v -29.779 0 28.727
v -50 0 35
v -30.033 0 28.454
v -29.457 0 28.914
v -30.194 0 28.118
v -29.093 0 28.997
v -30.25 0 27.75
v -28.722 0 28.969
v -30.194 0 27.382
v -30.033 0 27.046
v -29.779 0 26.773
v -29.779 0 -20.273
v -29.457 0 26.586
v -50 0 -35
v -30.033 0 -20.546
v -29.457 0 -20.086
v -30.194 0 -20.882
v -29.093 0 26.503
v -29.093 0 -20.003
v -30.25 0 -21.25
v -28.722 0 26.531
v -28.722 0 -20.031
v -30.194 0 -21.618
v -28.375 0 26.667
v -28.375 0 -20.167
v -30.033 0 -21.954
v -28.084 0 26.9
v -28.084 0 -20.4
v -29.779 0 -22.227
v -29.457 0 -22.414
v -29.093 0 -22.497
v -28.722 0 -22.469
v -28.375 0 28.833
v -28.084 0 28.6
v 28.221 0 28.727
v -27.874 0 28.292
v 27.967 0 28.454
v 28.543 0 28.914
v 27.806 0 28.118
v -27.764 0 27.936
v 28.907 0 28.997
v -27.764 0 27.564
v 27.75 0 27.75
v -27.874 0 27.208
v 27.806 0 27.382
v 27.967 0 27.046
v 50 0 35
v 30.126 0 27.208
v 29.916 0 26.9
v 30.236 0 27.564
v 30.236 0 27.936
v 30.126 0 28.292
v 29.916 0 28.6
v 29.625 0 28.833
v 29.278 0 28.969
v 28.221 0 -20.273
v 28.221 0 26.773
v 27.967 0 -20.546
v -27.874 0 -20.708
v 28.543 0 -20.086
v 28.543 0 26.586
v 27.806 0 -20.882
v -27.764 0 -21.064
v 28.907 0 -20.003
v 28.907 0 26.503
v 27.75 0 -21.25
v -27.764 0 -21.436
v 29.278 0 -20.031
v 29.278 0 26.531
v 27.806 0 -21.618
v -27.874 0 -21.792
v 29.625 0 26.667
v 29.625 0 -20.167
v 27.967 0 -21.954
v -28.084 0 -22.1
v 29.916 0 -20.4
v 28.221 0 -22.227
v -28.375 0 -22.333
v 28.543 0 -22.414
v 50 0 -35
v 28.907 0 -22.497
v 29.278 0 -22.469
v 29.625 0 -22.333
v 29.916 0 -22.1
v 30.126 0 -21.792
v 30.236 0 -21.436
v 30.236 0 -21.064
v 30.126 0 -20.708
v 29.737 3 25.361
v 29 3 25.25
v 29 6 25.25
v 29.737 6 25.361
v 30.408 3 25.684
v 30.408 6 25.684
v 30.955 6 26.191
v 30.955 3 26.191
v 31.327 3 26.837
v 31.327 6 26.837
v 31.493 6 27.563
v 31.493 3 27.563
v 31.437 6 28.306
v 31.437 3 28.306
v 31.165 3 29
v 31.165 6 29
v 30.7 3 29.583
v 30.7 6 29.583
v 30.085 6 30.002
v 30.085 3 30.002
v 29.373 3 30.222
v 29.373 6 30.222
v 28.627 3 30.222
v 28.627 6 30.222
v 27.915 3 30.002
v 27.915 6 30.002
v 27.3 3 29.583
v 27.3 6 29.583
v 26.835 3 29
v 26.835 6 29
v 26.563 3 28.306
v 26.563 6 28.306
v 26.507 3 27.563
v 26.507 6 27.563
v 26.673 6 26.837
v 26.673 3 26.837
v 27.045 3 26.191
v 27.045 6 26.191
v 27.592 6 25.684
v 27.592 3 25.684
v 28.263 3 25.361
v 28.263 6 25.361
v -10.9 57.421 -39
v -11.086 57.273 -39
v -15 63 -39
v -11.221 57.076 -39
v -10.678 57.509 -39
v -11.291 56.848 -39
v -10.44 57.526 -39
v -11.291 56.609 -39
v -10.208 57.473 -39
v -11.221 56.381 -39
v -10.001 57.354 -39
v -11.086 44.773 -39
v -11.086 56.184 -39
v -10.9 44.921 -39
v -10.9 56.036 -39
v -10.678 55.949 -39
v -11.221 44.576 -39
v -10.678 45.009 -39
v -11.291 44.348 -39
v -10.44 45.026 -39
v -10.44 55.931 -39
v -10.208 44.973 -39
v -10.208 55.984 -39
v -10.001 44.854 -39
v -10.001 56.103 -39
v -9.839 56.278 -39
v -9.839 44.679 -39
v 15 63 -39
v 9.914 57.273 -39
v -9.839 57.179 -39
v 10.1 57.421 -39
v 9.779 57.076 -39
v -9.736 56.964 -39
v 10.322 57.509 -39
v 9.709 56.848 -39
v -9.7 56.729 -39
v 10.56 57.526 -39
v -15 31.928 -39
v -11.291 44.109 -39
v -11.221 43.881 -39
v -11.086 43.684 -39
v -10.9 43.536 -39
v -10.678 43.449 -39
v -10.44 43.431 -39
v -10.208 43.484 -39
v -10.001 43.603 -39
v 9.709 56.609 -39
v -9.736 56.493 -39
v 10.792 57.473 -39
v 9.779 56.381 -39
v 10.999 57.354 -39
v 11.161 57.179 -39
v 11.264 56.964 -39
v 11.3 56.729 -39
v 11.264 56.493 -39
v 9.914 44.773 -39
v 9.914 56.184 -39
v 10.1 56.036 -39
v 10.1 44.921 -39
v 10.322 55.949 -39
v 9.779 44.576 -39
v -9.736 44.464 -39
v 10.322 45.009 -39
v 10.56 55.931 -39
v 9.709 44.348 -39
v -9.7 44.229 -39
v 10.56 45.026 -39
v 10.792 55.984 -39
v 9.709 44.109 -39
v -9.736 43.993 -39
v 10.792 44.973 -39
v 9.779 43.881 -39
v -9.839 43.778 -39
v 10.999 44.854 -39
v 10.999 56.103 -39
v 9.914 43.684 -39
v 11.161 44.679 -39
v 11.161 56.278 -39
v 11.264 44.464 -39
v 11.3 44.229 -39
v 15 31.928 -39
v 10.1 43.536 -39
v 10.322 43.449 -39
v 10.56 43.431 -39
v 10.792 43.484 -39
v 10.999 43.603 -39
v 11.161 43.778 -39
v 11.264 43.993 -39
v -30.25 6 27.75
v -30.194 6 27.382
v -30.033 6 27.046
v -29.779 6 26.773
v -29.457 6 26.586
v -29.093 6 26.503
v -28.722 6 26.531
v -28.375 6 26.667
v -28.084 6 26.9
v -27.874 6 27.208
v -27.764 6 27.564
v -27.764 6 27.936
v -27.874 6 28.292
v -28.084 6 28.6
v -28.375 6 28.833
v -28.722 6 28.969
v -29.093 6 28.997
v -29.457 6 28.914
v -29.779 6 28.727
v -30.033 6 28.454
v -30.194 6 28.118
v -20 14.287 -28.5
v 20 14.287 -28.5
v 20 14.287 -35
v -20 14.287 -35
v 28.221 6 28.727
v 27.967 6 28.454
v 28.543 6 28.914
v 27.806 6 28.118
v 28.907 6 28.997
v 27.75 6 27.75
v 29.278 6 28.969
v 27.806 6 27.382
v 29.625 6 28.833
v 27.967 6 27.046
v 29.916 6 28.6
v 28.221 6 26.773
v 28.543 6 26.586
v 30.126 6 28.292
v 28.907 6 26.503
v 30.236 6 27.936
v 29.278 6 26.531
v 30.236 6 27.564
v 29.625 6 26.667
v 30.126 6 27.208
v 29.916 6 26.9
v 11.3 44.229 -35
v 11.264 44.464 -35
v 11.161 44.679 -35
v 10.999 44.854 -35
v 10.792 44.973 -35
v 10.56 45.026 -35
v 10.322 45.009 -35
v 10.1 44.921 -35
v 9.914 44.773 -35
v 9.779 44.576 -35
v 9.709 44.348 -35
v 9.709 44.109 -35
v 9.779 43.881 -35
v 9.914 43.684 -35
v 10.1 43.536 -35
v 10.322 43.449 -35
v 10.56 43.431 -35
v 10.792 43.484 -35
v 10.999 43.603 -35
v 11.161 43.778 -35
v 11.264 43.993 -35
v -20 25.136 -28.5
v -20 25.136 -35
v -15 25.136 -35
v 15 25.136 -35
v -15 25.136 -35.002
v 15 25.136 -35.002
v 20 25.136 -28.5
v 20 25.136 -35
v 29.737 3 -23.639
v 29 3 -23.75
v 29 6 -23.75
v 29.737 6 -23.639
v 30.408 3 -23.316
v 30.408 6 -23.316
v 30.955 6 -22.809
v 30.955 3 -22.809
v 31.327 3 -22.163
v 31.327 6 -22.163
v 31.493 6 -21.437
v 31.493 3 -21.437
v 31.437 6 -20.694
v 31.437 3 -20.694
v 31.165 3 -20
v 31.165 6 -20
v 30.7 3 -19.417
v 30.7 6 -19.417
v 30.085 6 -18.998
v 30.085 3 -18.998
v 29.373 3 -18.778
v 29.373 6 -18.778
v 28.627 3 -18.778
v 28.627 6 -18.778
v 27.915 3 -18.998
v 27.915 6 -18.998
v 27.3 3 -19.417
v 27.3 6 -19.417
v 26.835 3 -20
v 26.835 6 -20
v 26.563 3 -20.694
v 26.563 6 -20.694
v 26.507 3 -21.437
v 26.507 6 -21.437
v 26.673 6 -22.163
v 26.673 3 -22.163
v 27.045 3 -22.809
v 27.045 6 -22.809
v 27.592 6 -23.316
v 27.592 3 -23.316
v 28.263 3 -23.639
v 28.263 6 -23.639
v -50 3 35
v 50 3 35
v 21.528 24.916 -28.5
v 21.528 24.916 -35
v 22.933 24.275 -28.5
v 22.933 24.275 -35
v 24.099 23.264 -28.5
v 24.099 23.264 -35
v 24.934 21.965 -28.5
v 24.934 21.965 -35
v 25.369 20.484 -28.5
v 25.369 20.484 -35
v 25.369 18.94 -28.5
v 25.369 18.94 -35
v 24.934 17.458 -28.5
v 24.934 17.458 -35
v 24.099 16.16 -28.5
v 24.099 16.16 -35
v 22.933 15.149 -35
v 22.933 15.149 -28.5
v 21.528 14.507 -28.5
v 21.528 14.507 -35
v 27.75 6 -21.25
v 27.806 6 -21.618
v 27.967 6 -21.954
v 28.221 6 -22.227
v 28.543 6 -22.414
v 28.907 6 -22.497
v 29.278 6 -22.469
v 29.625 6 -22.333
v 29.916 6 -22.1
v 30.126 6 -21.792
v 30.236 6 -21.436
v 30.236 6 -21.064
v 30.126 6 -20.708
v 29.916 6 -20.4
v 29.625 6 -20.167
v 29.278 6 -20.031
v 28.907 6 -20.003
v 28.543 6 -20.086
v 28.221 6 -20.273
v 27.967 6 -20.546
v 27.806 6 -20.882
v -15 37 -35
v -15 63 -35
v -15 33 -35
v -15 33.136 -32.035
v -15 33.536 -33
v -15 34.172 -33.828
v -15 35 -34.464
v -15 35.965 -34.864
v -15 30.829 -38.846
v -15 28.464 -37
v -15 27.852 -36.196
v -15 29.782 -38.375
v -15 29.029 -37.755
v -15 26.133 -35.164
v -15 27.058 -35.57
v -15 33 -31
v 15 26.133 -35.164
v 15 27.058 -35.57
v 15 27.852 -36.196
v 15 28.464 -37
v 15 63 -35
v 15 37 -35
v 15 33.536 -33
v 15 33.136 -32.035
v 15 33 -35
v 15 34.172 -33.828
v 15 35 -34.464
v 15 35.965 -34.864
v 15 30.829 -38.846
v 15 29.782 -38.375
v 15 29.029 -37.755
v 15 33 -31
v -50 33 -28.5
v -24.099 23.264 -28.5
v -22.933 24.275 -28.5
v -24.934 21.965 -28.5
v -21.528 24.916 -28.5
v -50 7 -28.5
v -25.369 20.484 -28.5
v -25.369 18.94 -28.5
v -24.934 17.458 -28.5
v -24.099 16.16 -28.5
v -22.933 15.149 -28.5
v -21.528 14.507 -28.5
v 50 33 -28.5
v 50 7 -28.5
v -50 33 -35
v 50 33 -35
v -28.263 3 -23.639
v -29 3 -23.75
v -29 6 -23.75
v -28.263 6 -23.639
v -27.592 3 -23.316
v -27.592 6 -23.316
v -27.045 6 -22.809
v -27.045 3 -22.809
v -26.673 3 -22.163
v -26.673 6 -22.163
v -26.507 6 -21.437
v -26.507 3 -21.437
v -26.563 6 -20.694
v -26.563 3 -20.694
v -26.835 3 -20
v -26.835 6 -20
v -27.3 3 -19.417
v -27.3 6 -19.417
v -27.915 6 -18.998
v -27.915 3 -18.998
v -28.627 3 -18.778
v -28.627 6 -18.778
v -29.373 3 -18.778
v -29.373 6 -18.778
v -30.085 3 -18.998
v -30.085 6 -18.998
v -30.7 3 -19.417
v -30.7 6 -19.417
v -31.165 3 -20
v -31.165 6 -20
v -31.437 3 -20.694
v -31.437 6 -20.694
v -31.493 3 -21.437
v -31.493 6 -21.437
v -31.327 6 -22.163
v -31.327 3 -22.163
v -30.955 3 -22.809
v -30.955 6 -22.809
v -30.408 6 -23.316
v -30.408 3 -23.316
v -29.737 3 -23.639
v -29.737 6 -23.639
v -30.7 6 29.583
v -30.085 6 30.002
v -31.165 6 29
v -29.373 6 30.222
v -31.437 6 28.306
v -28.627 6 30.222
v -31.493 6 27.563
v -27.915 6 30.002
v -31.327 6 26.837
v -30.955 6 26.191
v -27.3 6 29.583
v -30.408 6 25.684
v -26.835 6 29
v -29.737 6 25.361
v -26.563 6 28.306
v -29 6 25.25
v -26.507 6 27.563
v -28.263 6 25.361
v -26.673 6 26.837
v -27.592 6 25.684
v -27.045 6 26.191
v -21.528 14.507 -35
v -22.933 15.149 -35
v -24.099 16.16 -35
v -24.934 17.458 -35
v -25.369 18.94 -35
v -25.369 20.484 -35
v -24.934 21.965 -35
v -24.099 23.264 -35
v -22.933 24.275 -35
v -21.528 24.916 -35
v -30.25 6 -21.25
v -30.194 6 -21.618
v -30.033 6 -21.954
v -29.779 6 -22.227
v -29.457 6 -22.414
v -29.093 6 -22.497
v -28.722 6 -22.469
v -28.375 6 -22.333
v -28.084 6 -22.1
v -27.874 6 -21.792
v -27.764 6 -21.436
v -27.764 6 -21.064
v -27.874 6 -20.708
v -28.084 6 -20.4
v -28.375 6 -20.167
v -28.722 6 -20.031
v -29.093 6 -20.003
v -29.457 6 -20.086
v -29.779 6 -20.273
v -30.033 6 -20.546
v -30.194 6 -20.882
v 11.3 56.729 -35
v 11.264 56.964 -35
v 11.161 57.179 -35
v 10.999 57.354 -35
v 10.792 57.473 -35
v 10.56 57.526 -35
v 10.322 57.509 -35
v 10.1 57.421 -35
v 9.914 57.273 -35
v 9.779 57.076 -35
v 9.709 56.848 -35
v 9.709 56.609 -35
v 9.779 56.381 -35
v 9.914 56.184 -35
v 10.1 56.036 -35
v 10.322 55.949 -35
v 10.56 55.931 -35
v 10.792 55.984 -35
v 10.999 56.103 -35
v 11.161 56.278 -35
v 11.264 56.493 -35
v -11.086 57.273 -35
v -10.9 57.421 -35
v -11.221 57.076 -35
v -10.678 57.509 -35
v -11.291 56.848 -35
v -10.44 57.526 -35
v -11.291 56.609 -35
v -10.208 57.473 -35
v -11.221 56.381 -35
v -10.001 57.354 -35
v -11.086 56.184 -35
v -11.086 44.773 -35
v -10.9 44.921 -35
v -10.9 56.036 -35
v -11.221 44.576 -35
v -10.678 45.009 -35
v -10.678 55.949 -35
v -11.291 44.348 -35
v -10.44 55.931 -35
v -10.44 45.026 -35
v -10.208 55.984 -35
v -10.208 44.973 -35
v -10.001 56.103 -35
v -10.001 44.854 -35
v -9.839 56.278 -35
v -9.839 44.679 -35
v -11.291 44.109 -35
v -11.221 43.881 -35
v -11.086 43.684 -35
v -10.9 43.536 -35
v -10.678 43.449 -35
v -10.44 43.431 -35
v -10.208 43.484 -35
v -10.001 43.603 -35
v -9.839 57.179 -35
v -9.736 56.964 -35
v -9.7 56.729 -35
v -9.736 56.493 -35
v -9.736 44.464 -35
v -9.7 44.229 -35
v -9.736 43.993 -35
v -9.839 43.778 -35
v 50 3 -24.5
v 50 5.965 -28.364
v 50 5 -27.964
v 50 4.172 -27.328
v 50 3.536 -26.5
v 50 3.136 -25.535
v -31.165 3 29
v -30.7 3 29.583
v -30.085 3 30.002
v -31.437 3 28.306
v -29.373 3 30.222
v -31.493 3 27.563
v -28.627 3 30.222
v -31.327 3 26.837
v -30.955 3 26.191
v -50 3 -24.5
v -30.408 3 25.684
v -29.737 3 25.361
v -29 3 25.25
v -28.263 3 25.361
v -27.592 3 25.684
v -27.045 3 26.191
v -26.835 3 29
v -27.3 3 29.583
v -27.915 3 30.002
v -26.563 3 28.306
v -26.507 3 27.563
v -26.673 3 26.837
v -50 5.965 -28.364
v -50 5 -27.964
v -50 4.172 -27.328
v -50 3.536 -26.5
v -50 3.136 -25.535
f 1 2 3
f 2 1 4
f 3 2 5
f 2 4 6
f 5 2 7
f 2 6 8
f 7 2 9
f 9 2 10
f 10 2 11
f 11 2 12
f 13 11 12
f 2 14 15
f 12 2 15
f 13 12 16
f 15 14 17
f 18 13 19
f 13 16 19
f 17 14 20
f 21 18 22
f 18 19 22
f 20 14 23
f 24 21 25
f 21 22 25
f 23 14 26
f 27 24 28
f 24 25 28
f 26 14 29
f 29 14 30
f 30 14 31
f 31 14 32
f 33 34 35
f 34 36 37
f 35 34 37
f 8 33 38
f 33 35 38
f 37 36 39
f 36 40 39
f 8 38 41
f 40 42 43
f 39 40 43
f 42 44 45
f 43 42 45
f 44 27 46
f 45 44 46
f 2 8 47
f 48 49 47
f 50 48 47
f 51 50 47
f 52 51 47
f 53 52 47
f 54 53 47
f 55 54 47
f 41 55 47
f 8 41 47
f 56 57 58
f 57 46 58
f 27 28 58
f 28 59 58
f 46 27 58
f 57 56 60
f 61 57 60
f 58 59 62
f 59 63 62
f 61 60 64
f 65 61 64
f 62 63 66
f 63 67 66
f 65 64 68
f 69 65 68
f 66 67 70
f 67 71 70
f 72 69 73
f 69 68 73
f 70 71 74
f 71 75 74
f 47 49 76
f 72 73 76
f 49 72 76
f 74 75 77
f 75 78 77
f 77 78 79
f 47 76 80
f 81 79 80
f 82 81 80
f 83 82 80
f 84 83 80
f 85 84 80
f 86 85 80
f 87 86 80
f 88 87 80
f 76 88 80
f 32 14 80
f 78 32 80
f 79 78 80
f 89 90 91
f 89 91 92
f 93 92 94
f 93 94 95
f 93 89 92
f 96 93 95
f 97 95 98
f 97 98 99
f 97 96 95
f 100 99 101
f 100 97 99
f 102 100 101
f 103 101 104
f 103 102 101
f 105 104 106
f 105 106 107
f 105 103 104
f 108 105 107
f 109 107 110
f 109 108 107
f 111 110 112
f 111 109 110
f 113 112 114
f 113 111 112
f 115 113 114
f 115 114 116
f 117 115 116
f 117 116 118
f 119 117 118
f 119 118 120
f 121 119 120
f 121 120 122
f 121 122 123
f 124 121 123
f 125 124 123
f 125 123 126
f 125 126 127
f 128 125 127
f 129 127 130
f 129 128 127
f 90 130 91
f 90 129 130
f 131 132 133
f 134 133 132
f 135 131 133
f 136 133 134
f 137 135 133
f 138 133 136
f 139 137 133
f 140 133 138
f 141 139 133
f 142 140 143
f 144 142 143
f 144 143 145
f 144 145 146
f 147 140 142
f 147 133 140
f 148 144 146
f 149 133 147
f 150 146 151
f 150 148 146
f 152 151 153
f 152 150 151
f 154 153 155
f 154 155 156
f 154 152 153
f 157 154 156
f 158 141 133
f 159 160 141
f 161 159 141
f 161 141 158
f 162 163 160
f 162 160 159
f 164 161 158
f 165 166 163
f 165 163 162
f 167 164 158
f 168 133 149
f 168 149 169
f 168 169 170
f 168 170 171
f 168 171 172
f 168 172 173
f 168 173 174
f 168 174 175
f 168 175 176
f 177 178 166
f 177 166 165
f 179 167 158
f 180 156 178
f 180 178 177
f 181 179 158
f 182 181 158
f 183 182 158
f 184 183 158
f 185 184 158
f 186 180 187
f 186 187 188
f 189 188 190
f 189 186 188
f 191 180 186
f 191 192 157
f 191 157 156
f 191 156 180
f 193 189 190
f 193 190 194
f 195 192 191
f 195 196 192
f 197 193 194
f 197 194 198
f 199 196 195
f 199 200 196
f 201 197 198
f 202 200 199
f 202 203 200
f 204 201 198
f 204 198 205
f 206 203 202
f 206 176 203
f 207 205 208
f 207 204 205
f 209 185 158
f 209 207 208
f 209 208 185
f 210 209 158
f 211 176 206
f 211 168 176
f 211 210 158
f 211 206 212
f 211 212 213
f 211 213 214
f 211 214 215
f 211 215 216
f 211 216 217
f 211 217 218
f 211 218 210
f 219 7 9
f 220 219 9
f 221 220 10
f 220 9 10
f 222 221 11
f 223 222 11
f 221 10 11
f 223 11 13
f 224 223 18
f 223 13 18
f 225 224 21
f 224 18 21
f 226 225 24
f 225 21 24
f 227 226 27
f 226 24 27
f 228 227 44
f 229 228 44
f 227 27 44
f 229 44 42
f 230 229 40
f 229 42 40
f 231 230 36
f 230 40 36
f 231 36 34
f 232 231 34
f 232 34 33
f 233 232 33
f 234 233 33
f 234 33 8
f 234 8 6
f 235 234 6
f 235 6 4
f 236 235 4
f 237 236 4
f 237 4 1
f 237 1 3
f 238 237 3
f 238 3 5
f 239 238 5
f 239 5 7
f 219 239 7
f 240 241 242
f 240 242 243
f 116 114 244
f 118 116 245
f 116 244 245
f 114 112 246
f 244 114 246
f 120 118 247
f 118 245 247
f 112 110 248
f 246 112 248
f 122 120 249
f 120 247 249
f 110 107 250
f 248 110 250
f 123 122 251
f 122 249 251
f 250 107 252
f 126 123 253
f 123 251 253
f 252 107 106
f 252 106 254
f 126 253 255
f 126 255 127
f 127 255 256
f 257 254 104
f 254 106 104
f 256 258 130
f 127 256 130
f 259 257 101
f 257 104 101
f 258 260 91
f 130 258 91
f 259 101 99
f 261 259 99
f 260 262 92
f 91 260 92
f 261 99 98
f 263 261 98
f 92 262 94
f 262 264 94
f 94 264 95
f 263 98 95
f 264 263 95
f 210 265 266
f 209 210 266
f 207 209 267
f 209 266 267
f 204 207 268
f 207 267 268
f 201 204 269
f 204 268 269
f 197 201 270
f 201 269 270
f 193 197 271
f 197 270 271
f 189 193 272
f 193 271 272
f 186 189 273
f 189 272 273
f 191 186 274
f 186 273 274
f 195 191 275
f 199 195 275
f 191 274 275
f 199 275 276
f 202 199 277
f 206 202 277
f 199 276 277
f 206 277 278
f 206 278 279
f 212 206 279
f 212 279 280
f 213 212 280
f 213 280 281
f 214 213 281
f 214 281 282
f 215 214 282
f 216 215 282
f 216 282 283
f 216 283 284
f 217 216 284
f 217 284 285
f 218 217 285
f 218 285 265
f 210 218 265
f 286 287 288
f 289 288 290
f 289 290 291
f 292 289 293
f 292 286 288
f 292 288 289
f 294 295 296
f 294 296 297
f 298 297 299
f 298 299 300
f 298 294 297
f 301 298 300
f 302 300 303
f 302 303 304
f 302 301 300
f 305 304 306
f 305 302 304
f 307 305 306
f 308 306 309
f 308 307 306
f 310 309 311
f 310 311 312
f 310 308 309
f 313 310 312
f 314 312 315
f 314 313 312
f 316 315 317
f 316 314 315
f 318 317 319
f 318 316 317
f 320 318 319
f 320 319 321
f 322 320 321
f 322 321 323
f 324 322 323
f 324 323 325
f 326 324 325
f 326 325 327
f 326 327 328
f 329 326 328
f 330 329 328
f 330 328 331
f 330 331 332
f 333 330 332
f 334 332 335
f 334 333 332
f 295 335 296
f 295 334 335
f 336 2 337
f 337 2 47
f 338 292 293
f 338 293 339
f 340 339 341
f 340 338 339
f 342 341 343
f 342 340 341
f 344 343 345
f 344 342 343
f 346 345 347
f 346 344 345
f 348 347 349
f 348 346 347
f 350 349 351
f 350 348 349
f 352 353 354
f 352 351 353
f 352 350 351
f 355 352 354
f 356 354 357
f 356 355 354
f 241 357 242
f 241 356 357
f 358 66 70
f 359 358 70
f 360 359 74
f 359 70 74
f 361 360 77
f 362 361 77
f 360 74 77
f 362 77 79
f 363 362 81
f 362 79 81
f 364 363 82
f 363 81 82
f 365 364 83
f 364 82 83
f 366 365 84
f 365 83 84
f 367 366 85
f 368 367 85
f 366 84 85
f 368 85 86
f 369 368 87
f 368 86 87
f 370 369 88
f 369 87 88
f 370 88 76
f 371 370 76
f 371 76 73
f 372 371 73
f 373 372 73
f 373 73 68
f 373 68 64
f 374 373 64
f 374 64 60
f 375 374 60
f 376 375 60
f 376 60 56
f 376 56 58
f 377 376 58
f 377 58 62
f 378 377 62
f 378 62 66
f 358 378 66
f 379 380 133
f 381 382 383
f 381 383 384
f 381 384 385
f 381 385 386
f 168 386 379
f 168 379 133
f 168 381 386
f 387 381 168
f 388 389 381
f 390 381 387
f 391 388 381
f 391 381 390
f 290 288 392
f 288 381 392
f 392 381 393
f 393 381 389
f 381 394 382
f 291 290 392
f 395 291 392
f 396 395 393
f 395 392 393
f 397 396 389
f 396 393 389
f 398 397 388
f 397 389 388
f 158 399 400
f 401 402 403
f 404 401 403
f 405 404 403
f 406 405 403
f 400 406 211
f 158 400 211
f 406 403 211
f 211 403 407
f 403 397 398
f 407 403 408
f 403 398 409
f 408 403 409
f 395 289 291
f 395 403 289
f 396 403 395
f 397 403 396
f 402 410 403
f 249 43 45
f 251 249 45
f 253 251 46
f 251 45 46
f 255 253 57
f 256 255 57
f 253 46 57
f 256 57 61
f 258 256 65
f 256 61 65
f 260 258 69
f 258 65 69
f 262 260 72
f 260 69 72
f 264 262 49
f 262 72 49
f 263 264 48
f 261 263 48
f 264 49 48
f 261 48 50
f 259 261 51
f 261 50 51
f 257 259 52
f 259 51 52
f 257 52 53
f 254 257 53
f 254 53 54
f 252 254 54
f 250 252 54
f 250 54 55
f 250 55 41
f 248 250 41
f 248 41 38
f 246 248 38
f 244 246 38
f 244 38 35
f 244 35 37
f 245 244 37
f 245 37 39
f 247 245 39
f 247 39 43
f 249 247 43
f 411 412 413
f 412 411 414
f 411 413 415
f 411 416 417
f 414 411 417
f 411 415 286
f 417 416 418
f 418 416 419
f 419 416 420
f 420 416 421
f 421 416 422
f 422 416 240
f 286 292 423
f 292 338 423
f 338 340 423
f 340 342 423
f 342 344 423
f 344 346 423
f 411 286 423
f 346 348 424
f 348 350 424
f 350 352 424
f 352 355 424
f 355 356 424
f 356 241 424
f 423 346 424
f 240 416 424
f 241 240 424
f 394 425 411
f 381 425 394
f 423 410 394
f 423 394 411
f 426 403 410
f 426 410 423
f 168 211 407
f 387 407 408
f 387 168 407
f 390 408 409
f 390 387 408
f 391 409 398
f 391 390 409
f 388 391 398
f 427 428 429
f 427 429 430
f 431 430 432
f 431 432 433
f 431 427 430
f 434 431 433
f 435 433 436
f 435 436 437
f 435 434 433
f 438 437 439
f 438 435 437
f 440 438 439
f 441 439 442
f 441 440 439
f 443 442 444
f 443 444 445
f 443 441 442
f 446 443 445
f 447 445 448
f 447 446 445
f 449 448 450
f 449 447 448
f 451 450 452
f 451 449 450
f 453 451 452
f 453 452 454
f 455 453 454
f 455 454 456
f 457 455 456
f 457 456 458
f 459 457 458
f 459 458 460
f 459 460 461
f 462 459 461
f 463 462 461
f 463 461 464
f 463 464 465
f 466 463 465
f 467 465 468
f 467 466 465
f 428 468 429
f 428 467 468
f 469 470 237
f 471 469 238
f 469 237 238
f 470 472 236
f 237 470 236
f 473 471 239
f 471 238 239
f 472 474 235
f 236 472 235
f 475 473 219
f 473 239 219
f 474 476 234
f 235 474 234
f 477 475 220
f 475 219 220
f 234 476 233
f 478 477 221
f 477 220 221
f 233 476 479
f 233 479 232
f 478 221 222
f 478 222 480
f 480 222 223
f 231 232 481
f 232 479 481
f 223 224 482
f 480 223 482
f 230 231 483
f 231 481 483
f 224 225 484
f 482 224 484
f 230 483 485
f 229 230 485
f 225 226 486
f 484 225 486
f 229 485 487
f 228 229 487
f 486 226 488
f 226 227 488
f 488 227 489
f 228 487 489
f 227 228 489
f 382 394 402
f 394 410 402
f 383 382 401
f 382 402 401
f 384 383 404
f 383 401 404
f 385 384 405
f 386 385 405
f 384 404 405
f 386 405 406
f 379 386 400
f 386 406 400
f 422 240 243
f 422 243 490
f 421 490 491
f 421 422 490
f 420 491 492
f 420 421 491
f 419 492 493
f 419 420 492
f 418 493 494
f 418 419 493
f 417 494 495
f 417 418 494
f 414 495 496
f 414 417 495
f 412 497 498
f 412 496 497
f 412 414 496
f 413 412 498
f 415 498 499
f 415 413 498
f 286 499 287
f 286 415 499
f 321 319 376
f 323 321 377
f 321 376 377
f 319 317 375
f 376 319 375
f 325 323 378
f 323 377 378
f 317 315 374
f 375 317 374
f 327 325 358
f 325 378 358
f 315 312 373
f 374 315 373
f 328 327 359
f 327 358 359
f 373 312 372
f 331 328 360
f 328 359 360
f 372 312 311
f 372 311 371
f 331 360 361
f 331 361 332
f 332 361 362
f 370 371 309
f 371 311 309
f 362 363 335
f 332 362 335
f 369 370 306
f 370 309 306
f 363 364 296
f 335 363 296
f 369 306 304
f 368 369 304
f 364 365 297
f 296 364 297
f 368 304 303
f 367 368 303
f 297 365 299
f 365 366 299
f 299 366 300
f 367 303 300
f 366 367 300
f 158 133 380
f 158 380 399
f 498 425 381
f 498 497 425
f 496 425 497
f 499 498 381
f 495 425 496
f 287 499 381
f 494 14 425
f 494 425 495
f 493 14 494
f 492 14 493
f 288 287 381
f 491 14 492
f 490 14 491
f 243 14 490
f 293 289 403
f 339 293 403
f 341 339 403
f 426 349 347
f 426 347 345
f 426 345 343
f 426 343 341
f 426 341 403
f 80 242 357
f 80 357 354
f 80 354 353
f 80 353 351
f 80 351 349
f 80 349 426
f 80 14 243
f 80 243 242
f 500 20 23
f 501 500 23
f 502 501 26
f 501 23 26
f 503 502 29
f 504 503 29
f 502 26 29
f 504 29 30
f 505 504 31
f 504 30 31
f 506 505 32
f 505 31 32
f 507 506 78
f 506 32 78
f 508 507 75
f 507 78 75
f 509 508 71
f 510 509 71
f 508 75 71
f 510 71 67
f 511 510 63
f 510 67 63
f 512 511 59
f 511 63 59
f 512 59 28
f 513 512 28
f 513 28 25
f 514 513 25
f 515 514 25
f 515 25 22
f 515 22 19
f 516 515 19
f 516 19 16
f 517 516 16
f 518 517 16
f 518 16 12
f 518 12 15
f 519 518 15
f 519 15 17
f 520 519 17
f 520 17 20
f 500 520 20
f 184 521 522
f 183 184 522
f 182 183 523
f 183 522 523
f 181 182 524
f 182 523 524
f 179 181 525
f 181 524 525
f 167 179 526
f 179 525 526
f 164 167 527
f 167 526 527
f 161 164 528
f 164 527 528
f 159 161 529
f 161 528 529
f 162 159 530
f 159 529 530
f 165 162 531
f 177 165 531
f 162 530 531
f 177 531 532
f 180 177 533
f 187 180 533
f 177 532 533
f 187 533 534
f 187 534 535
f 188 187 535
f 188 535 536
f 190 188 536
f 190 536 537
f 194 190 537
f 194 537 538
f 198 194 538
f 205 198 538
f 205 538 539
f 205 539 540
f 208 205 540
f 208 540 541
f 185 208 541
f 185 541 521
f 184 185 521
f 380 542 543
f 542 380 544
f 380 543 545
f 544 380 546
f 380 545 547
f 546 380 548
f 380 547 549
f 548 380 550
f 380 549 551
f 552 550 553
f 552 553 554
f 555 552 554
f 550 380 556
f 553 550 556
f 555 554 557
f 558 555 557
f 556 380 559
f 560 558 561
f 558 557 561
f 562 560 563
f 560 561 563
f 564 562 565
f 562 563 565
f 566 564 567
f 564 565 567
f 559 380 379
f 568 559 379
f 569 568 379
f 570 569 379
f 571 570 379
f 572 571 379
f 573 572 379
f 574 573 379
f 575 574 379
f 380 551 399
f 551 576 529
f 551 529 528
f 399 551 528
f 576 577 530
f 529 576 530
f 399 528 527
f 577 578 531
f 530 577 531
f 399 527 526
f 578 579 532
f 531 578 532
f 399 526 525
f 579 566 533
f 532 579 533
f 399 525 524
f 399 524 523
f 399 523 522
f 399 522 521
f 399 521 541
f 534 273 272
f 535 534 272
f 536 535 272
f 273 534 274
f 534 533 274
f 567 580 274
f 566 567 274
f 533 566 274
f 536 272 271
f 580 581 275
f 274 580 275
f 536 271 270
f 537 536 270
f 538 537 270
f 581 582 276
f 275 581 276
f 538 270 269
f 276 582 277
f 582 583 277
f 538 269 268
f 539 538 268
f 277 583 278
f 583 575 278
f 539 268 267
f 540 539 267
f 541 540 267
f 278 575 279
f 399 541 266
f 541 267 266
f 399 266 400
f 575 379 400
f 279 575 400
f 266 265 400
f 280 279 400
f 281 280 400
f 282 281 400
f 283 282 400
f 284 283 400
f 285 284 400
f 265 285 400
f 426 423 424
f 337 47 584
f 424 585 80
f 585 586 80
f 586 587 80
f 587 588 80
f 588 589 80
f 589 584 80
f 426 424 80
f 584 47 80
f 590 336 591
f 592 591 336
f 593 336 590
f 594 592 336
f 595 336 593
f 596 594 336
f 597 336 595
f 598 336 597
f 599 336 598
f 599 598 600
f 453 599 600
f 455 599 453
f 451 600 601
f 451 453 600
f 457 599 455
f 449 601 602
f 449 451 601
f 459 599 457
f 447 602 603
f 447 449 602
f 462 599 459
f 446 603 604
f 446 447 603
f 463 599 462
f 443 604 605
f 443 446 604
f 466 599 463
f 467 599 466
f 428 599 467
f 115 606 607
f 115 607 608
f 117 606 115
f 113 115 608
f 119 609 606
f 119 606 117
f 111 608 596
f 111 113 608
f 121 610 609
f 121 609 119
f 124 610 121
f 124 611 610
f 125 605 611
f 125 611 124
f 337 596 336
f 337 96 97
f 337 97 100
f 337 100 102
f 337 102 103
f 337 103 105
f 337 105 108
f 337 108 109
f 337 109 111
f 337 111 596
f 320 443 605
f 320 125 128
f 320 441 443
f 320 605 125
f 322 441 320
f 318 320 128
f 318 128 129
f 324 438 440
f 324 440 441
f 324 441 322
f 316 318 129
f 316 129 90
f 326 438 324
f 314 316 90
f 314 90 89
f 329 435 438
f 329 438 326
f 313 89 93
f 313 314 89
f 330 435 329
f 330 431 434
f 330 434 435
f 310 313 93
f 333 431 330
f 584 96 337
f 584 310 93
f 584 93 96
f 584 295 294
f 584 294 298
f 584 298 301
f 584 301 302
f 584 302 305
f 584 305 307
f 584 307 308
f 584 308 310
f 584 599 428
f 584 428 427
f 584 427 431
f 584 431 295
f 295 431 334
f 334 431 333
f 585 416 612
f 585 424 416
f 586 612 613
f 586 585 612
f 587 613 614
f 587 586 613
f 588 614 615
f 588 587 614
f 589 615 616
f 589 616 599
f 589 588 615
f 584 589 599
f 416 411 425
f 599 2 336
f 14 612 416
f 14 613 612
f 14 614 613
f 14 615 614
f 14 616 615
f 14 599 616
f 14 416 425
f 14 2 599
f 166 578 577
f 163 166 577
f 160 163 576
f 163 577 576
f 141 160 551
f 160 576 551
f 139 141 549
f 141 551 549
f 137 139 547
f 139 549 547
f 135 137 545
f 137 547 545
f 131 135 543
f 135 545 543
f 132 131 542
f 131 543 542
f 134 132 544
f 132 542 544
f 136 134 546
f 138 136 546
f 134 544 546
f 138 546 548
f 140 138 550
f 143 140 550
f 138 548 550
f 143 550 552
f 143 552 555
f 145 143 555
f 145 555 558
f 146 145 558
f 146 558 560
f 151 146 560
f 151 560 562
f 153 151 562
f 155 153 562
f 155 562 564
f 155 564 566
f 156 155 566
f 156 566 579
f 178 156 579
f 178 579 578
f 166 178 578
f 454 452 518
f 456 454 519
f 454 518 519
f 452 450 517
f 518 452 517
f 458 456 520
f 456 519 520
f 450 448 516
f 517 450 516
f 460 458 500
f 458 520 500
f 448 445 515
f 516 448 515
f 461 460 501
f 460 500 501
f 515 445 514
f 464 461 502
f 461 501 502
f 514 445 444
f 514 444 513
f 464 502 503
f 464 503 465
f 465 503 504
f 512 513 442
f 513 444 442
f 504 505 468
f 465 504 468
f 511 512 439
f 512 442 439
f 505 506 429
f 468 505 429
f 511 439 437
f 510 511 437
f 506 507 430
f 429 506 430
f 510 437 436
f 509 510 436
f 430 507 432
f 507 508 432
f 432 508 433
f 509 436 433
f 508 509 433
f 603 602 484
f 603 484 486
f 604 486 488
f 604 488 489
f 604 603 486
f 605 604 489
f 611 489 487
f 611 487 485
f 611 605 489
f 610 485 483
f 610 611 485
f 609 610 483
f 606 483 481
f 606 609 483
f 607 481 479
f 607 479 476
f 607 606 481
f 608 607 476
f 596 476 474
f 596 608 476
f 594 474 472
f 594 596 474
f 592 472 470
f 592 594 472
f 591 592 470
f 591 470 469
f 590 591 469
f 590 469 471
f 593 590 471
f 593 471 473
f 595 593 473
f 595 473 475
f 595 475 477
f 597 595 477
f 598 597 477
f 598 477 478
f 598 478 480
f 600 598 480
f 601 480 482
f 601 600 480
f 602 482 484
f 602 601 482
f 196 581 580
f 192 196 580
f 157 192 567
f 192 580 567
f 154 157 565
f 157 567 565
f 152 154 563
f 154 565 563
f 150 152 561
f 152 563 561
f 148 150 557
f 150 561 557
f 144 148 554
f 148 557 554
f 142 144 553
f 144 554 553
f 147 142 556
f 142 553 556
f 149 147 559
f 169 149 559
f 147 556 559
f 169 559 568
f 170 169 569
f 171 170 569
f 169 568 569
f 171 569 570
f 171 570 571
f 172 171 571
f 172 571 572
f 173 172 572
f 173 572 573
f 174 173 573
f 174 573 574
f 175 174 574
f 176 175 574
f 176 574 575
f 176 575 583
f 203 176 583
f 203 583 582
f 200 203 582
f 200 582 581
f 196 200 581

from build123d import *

# Parameters (mm, degrees)
SKETCH1_W                 = 100
SKETCH1_H                 = 70
BOSS_EXTRUDE1_DEPTH       = 3
SKETCH2_W                 = 100
SKETCH2_H                 = 6.5
BOSS_EXTRUDE2_DEPTH       = 30
SKETCH14_R                = 2.5
BOSS_EXTRUDE5_DEPTH       = 3
F_2_5MM_DOWEL_HOLE4_D     = 2.5
SKETCH21_W                = 30
SKETCH21_H                = 4
BOSS_EXTRUDE6_DEPTH       = 4
SKETCH22_W                = 30
SKETCH22_H                = 4
BOSS_EXTRUDE7_DEPTH       = 30
FILLET6_R                 = 4
FILLET7_R                 = 4
FILLET8_R                 = 4
M2X0_4_TAPPED_HOLE1_D     = 1.6
M2X0_4_TAPPED_HOLE1_DEPTH = 13
M2X0_4_TAPPED_HOLE1_TIP   = 0.480688495
FILLET9_R                 = 4
CUT_EXTRUDE10_DEPTH       = 14


with BuildPart() as part:
    # Sketch1 → Boss-Extrude1 (new body)
    with BuildSketch(Plane(origin=(0, 0, 0), x_dir=(1, 0, 0), z_dir=(0, 1, 0))):
        Rectangle(SKETCH1_W, SKETCH1_H)
    extrude(amount=BOSS_EXTRUDE1_DEPTH)

    # Sketch2 → Boss-Extrude2 (add)
    with BuildSketch(Plane(origin=(0, 3, 0), x_dir=(1, 0, 0), z_dir=(0, 1, 0))):
        with Locations((0, 31.75)):
            Rectangle(SKETCH2_W, SKETCH2_H)
    extrude(amount=BOSS_EXTRUDE2_DEPTH)

    # Sketch14 → Boss-Extrude5 (add)
    with BuildSketch(Plane(origin=(0, 3, -3), x_dir=(1, 0, 0), z_dir=(0, -1, 0))):
        with Locations(Location((-29, -18.25, 0), (0, 0, 270))):
            Circle(SKETCH14_R)
        with Locations(Location((-29, 30.75, 0), (0, 0, 270))):
            Circle(SKETCH14_R)
        with Locations(Location((29, -18.25, 0), (0, 0, 270))):
            Circle(SKETCH14_R)
        with Locations(Location((29, 30.75, 0), (0, 0, 270))):
            Circle(SKETCH14_R)
    extrude(amount=-BOSS_EXTRUDE5_DEPTH)

    # Ø2.5mm Dowel Hole4 (through all)
    with Locations(Plane(origin=(0, 6, 0), x_dir=(1, 0, 0), z_dir=(0, 1, 0))):
        with Locations((-29, 21.25), (29, 21.25), (29, -27.75), (-29, -27.75)):
            Hole(F_2_5MM_DOWEL_HOLE4_D / 2)

    # Sketch21 → Boss-Extrude6 (add)
    with BuildSketch(Plane(origin=(0, 0, -35), x_dir=(-1, 0, 0), z_dir=(0, 0, -1))):
        with Locations((0, 31)):
            Rectangle(SKETCH21_W, SKETCH21_H)
    extrude(amount=BOSS_EXTRUDE6_DEPTH)

    # Sketch22 → Boss-Extrude7 (add)
    with BuildSketch(Plane(origin=(0, 33, 0), x_dir=(1, 0, 0), z_dir=(0, 1, 0))):
        with Locations((0, 37)):
            Rectangle(SKETCH22_W, SKETCH22_H)
    extrude(amount=BOSS_EXTRUDE7_DEPTH)

    # Fillet6
    fillet6_edges = [part.edges().sort_by_distance(p)[0] for p in [
        (0, 33, -35),
    ]]
    fillet(fillet6_edges, radius=FILLET6_R)

    # Fillet7
    fillet7_edges = [part.edges().sort_by_distance(p)[0] for p in [
        (0, 29, -35),
    ]]
    fillet(fillet7_edges, radius=FILLET7_R - 0.0001)  # a hair under: the kernel refuses the full size

    # Fillet8
    fillet8_edges = [part.edges().sort_by_distance(p)[0] for p in [
        (0, 29, -39),
    ]]
    fillet(fillet8_edges, radius=FILLET8_R)

    # M2x0.4 Tapped Hole1
    with Locations(Plane(origin=(0, 0, -39), x_dir=(-1, 0, 0), z_dir=(0, 0, -1))):
        with Locations((-10.5, 56.728604695), (10.5, 56.728604695), (10.5, 44.228604695), (-10.5, 44.228604695)):
            Hole(M2X0_4_TAPPED_HOLE1_D / 2, depth=M2X0_4_TAPPED_HOLE1_DEPTH)
            with Locations((0, 0, -(M2X0_4_TAPPED_HOLE1_DEPTH + M2X0_4_TAPPED_HOLE1_TIP / 2))):  # 118° drill point
                Cone(0, M2X0_4_TAPPED_HOLE1_D / 2, M2X0_4_TAPPED_HOLE1_TIP, mode=Mode.SUBTRACT)

    # Fillet9
    fillet9_edges = [part.edges().sort_by_distance(p)[0] for p in [
        (0, 3, -28.5),
    ]]
    fillet(fillet9_edges, radius=FILLET9_R)

    # Sketch28 → Cut-Extrude10 (cut)
    with BuildSketch(Plane.XY.offset(-28.5)):
        with BuildLine():
            Line((-20, 25.135697653), (20, 25.135697653))
            ThreePointArc((20, 25.135697653), (25.424121319, 19.711576334), (20, 14.287455015))
            Line((20, 14.287455015), (-20, 14.287455015))
            ThreePointArc((-20, 14.287455015), (-25.424121319, 19.711576334), (-20, 25.135697653))
        make_face()
    extrude(amount=-CUT_EXTRUDE10_DEPTH, mode=Mode.SUBTRACT)


solid = part.part
